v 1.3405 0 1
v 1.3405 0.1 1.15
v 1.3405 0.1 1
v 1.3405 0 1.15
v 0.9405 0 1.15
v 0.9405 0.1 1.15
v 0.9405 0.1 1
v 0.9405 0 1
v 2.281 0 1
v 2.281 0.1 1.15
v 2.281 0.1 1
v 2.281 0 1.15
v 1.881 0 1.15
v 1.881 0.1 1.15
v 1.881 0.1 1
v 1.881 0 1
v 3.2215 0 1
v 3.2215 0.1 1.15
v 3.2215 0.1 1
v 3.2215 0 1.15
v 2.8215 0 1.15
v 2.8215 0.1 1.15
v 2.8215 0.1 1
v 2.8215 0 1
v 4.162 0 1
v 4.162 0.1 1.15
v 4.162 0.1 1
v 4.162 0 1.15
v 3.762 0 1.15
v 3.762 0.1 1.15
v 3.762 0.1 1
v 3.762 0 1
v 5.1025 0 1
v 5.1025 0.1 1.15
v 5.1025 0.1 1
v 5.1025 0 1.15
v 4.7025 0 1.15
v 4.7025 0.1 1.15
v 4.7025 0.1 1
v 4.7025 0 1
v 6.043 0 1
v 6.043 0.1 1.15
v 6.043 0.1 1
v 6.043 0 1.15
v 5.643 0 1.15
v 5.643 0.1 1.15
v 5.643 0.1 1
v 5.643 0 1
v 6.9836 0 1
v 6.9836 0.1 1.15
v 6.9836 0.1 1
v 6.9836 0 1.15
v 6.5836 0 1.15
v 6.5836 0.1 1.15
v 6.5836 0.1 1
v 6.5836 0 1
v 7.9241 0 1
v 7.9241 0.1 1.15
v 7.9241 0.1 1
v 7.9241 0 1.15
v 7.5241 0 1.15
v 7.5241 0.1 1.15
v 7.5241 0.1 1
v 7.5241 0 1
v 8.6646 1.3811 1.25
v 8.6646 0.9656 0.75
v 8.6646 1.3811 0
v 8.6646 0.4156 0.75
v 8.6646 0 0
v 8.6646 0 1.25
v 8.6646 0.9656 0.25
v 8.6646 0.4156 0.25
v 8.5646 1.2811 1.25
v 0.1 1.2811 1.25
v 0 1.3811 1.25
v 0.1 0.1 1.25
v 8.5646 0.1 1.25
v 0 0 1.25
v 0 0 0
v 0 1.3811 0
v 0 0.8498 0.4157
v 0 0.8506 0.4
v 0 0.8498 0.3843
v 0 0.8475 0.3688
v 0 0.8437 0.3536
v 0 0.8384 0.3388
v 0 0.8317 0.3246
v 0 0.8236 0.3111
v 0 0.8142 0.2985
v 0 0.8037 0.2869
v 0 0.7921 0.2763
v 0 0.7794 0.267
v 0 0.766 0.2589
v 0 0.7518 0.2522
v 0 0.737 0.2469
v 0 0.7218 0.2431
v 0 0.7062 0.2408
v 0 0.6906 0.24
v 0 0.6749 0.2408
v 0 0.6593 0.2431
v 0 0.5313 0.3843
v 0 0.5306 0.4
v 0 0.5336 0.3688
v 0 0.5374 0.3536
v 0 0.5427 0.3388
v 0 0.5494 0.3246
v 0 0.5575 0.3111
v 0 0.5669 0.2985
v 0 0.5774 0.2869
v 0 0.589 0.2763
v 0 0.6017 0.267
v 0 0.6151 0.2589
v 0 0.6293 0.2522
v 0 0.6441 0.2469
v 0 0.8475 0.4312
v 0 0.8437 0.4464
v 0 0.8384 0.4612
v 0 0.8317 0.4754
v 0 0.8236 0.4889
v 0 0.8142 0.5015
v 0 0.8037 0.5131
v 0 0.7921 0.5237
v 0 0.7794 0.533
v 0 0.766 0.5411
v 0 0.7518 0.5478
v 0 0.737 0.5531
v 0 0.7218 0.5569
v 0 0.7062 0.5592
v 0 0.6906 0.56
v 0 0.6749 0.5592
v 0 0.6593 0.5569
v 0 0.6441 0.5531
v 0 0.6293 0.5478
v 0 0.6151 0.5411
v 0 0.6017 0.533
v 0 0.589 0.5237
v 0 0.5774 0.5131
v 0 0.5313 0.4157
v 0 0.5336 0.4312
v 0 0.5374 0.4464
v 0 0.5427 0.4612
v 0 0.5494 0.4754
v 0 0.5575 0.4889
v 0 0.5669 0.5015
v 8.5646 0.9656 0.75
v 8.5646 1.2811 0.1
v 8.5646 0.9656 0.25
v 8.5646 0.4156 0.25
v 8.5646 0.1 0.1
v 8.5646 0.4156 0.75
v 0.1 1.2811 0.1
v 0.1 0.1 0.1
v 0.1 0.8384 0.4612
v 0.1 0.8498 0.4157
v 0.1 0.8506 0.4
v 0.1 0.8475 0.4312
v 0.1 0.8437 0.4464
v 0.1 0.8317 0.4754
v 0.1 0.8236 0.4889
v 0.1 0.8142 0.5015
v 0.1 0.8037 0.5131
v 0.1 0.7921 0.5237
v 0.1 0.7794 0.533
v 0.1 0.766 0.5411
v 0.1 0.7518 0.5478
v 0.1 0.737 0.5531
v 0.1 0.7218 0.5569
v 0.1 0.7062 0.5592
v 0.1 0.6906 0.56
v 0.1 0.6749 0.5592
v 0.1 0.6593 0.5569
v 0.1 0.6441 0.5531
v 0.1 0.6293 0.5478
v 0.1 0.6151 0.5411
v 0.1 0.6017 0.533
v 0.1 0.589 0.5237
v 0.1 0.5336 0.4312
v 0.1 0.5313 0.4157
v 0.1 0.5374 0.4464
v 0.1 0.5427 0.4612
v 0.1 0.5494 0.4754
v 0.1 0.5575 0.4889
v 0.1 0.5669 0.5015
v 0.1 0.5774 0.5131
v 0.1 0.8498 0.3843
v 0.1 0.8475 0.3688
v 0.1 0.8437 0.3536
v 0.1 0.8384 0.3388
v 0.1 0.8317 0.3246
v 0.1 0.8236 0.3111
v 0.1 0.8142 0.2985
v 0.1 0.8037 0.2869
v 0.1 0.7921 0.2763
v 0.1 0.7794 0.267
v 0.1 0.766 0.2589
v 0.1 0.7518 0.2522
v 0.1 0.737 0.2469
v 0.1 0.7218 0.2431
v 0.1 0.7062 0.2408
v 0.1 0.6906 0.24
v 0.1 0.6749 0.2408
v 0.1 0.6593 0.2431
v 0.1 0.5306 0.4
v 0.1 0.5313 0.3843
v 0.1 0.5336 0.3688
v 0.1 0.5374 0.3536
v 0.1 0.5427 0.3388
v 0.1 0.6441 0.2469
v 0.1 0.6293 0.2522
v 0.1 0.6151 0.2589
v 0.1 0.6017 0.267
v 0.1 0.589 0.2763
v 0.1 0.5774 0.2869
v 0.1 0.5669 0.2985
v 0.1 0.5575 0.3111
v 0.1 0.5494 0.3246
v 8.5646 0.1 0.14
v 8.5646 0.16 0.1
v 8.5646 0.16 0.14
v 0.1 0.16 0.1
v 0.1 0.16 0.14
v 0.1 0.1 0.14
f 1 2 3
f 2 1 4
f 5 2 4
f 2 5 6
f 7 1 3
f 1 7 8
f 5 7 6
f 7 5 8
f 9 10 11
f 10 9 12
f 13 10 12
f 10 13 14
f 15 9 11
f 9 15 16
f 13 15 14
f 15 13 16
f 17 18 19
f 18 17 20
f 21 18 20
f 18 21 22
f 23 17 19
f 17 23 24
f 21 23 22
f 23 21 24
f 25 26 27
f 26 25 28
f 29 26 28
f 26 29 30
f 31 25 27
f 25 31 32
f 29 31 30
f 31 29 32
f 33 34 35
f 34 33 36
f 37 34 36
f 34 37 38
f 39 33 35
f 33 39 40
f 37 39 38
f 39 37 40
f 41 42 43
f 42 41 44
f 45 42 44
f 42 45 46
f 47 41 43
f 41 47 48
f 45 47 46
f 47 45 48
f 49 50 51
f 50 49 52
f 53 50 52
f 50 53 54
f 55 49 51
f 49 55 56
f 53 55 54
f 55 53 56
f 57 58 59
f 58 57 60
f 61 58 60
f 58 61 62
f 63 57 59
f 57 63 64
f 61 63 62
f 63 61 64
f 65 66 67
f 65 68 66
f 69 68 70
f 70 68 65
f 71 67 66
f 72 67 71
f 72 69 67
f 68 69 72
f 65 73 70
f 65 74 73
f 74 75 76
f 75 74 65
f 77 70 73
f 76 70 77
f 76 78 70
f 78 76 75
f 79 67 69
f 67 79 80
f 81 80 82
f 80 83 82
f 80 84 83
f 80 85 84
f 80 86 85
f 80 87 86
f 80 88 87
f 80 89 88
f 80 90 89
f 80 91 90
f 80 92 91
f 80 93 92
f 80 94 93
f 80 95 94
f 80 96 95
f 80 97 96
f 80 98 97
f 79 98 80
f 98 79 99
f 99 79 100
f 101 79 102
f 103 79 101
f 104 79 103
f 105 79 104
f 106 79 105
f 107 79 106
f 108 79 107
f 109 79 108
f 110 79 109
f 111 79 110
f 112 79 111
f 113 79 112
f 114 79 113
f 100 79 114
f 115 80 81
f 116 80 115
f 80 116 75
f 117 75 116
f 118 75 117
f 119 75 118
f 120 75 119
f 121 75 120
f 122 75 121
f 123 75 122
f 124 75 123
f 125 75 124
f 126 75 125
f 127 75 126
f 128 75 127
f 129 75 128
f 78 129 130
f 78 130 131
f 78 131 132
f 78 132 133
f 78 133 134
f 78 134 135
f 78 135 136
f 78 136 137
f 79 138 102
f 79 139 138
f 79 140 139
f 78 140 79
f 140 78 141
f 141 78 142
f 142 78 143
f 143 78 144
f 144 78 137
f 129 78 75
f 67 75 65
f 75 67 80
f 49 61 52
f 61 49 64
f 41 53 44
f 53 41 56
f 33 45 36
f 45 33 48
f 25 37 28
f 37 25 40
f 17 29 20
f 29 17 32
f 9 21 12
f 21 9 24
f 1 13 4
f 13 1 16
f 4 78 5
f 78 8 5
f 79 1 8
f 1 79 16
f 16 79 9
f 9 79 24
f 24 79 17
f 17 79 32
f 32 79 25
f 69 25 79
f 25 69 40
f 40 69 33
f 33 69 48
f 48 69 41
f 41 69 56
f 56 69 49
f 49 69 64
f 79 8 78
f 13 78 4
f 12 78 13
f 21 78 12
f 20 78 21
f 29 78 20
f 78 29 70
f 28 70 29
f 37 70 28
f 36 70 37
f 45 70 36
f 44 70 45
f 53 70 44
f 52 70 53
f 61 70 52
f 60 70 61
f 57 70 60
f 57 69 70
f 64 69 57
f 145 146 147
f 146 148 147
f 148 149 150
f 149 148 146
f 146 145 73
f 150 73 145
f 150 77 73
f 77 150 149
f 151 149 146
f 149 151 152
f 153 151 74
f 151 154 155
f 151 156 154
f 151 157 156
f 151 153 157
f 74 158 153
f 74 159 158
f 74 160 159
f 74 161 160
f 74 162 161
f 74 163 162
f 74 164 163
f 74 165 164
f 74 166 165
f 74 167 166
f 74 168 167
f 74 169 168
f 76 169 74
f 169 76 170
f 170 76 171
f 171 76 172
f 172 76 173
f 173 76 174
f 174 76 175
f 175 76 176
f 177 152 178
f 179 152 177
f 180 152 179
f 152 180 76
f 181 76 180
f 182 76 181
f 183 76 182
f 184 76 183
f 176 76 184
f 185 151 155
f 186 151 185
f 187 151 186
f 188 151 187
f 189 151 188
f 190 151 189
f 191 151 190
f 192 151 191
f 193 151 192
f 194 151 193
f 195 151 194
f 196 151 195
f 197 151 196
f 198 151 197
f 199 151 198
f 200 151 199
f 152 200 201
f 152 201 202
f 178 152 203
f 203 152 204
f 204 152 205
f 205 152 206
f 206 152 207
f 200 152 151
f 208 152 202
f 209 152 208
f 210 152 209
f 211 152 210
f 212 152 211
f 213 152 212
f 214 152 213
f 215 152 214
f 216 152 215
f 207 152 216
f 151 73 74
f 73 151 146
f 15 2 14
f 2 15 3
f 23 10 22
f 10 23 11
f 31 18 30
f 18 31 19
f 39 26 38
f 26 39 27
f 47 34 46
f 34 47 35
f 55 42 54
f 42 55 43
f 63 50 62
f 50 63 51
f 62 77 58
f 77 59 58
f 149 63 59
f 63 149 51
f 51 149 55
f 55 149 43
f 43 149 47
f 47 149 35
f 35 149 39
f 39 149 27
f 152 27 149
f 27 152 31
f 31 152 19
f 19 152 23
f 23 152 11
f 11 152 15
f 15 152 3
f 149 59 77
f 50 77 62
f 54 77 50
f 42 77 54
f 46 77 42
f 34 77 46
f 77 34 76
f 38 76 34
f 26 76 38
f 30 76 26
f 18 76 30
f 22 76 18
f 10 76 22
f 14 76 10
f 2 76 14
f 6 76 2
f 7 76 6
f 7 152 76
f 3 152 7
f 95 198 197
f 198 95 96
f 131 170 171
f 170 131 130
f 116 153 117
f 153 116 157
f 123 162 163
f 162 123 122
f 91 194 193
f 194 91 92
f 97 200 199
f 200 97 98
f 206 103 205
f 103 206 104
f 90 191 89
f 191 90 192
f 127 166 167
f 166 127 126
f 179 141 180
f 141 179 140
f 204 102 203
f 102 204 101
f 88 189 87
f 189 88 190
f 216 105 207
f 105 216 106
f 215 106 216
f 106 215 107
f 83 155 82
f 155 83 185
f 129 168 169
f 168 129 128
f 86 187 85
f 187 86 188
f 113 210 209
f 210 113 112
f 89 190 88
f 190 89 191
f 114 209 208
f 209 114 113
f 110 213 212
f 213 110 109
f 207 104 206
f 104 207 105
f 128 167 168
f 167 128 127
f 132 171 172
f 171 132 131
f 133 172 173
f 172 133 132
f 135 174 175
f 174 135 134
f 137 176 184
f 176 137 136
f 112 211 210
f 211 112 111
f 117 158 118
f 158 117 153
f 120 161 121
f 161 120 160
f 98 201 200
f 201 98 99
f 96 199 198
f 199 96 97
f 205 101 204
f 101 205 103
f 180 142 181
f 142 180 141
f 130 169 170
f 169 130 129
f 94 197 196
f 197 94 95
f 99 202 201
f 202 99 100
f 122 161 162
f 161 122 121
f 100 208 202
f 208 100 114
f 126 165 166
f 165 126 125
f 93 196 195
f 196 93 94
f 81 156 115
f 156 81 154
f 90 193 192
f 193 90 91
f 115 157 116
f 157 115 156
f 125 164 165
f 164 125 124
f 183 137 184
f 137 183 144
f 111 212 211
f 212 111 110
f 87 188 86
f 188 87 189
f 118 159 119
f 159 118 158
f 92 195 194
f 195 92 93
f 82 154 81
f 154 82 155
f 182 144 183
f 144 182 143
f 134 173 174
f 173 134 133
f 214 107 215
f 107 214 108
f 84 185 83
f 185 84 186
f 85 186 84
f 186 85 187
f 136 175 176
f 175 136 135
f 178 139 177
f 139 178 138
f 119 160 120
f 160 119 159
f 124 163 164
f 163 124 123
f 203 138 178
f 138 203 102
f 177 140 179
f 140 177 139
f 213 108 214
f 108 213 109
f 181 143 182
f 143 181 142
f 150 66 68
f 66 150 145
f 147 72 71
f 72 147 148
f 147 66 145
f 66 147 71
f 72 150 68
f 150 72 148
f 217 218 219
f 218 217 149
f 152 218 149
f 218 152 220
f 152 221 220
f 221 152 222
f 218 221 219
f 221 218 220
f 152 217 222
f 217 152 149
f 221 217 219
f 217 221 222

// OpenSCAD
// Industrial 12-Node Quantum Hub - Master Rack-Mountable Case
$fn = 64;

// Board & Case Dimensions (Matches the 215mm x 30mm KiCad 8.0 Edge.Cuts Profile)
pcb_length   = 215.0 * 0.0393701; // Convert mm to Inches (~8.46")
pcb_width    = 30.0  * 0.0393701; // Convert mm to Inches (~1.18")
case_height  = 1.25;               // Inches (Low-profile space management)
wall         = 0.10;               // Inches (Ruggedized wall thickness)

module master_server_enclosure() {
    difference() {
        // 1. Solid Outer Chassis Box (Printed in Standard Fire Red)
        cube([pcb_length + (wall * 2), pcb_width + (wall * 2), case_height], center=false);
        
        // 2. Main Internal Electronic Cavity
        translate([wall, wall, wall])
            cube([pcb_length, pcb_width, case_height]);
            
        // 3. Flush 2.1mm Input Power Barrel Jack Pass-Through Hole
        translate([-0.05, (pcb_width / 2) + wall, 0.4])
            rotate([0, 90, 0])
                cylinder(h = wall + 0.1, d = 0.32); // 8.1mm outer clearance thread diameter
                
        // 4. Flush Host Data Link USB-B Face Cutout
        // Eliminates loose external cabling directly at the server shelf boundary
        translate([pcb_length + wall - 0.05, (pcb_width / 2) + wall, 0.5])
            cube([wall + 0.2, 0.55, 0.50], center=true);
            
        // 5. Open Perimeter Ventilation Slots
        // Enhances structural thermal bleed from the 2oz/3oz thick copper bus
        for (slot = [1 : 1 : 8]) {
            translate([slot * (pcb_length / 9), -0.05, case_height - 0.25])
                cube([0.4, wall + 0.1, 0.15]);
        }
    }
    
    // 6. Internal Slide-Lock PCB Mounting Rails
    translate([wall, wall, wall])
        difference() {
            cube([pcb_length, 0.06, 0.12]);
            translate([-0.05, -0.01, 0.04])
                cube([pcb_length + 0.1, 0.08, 0.08]); // Recessed groove for PCB slide-in
        }
}

master_server_enclosure();
